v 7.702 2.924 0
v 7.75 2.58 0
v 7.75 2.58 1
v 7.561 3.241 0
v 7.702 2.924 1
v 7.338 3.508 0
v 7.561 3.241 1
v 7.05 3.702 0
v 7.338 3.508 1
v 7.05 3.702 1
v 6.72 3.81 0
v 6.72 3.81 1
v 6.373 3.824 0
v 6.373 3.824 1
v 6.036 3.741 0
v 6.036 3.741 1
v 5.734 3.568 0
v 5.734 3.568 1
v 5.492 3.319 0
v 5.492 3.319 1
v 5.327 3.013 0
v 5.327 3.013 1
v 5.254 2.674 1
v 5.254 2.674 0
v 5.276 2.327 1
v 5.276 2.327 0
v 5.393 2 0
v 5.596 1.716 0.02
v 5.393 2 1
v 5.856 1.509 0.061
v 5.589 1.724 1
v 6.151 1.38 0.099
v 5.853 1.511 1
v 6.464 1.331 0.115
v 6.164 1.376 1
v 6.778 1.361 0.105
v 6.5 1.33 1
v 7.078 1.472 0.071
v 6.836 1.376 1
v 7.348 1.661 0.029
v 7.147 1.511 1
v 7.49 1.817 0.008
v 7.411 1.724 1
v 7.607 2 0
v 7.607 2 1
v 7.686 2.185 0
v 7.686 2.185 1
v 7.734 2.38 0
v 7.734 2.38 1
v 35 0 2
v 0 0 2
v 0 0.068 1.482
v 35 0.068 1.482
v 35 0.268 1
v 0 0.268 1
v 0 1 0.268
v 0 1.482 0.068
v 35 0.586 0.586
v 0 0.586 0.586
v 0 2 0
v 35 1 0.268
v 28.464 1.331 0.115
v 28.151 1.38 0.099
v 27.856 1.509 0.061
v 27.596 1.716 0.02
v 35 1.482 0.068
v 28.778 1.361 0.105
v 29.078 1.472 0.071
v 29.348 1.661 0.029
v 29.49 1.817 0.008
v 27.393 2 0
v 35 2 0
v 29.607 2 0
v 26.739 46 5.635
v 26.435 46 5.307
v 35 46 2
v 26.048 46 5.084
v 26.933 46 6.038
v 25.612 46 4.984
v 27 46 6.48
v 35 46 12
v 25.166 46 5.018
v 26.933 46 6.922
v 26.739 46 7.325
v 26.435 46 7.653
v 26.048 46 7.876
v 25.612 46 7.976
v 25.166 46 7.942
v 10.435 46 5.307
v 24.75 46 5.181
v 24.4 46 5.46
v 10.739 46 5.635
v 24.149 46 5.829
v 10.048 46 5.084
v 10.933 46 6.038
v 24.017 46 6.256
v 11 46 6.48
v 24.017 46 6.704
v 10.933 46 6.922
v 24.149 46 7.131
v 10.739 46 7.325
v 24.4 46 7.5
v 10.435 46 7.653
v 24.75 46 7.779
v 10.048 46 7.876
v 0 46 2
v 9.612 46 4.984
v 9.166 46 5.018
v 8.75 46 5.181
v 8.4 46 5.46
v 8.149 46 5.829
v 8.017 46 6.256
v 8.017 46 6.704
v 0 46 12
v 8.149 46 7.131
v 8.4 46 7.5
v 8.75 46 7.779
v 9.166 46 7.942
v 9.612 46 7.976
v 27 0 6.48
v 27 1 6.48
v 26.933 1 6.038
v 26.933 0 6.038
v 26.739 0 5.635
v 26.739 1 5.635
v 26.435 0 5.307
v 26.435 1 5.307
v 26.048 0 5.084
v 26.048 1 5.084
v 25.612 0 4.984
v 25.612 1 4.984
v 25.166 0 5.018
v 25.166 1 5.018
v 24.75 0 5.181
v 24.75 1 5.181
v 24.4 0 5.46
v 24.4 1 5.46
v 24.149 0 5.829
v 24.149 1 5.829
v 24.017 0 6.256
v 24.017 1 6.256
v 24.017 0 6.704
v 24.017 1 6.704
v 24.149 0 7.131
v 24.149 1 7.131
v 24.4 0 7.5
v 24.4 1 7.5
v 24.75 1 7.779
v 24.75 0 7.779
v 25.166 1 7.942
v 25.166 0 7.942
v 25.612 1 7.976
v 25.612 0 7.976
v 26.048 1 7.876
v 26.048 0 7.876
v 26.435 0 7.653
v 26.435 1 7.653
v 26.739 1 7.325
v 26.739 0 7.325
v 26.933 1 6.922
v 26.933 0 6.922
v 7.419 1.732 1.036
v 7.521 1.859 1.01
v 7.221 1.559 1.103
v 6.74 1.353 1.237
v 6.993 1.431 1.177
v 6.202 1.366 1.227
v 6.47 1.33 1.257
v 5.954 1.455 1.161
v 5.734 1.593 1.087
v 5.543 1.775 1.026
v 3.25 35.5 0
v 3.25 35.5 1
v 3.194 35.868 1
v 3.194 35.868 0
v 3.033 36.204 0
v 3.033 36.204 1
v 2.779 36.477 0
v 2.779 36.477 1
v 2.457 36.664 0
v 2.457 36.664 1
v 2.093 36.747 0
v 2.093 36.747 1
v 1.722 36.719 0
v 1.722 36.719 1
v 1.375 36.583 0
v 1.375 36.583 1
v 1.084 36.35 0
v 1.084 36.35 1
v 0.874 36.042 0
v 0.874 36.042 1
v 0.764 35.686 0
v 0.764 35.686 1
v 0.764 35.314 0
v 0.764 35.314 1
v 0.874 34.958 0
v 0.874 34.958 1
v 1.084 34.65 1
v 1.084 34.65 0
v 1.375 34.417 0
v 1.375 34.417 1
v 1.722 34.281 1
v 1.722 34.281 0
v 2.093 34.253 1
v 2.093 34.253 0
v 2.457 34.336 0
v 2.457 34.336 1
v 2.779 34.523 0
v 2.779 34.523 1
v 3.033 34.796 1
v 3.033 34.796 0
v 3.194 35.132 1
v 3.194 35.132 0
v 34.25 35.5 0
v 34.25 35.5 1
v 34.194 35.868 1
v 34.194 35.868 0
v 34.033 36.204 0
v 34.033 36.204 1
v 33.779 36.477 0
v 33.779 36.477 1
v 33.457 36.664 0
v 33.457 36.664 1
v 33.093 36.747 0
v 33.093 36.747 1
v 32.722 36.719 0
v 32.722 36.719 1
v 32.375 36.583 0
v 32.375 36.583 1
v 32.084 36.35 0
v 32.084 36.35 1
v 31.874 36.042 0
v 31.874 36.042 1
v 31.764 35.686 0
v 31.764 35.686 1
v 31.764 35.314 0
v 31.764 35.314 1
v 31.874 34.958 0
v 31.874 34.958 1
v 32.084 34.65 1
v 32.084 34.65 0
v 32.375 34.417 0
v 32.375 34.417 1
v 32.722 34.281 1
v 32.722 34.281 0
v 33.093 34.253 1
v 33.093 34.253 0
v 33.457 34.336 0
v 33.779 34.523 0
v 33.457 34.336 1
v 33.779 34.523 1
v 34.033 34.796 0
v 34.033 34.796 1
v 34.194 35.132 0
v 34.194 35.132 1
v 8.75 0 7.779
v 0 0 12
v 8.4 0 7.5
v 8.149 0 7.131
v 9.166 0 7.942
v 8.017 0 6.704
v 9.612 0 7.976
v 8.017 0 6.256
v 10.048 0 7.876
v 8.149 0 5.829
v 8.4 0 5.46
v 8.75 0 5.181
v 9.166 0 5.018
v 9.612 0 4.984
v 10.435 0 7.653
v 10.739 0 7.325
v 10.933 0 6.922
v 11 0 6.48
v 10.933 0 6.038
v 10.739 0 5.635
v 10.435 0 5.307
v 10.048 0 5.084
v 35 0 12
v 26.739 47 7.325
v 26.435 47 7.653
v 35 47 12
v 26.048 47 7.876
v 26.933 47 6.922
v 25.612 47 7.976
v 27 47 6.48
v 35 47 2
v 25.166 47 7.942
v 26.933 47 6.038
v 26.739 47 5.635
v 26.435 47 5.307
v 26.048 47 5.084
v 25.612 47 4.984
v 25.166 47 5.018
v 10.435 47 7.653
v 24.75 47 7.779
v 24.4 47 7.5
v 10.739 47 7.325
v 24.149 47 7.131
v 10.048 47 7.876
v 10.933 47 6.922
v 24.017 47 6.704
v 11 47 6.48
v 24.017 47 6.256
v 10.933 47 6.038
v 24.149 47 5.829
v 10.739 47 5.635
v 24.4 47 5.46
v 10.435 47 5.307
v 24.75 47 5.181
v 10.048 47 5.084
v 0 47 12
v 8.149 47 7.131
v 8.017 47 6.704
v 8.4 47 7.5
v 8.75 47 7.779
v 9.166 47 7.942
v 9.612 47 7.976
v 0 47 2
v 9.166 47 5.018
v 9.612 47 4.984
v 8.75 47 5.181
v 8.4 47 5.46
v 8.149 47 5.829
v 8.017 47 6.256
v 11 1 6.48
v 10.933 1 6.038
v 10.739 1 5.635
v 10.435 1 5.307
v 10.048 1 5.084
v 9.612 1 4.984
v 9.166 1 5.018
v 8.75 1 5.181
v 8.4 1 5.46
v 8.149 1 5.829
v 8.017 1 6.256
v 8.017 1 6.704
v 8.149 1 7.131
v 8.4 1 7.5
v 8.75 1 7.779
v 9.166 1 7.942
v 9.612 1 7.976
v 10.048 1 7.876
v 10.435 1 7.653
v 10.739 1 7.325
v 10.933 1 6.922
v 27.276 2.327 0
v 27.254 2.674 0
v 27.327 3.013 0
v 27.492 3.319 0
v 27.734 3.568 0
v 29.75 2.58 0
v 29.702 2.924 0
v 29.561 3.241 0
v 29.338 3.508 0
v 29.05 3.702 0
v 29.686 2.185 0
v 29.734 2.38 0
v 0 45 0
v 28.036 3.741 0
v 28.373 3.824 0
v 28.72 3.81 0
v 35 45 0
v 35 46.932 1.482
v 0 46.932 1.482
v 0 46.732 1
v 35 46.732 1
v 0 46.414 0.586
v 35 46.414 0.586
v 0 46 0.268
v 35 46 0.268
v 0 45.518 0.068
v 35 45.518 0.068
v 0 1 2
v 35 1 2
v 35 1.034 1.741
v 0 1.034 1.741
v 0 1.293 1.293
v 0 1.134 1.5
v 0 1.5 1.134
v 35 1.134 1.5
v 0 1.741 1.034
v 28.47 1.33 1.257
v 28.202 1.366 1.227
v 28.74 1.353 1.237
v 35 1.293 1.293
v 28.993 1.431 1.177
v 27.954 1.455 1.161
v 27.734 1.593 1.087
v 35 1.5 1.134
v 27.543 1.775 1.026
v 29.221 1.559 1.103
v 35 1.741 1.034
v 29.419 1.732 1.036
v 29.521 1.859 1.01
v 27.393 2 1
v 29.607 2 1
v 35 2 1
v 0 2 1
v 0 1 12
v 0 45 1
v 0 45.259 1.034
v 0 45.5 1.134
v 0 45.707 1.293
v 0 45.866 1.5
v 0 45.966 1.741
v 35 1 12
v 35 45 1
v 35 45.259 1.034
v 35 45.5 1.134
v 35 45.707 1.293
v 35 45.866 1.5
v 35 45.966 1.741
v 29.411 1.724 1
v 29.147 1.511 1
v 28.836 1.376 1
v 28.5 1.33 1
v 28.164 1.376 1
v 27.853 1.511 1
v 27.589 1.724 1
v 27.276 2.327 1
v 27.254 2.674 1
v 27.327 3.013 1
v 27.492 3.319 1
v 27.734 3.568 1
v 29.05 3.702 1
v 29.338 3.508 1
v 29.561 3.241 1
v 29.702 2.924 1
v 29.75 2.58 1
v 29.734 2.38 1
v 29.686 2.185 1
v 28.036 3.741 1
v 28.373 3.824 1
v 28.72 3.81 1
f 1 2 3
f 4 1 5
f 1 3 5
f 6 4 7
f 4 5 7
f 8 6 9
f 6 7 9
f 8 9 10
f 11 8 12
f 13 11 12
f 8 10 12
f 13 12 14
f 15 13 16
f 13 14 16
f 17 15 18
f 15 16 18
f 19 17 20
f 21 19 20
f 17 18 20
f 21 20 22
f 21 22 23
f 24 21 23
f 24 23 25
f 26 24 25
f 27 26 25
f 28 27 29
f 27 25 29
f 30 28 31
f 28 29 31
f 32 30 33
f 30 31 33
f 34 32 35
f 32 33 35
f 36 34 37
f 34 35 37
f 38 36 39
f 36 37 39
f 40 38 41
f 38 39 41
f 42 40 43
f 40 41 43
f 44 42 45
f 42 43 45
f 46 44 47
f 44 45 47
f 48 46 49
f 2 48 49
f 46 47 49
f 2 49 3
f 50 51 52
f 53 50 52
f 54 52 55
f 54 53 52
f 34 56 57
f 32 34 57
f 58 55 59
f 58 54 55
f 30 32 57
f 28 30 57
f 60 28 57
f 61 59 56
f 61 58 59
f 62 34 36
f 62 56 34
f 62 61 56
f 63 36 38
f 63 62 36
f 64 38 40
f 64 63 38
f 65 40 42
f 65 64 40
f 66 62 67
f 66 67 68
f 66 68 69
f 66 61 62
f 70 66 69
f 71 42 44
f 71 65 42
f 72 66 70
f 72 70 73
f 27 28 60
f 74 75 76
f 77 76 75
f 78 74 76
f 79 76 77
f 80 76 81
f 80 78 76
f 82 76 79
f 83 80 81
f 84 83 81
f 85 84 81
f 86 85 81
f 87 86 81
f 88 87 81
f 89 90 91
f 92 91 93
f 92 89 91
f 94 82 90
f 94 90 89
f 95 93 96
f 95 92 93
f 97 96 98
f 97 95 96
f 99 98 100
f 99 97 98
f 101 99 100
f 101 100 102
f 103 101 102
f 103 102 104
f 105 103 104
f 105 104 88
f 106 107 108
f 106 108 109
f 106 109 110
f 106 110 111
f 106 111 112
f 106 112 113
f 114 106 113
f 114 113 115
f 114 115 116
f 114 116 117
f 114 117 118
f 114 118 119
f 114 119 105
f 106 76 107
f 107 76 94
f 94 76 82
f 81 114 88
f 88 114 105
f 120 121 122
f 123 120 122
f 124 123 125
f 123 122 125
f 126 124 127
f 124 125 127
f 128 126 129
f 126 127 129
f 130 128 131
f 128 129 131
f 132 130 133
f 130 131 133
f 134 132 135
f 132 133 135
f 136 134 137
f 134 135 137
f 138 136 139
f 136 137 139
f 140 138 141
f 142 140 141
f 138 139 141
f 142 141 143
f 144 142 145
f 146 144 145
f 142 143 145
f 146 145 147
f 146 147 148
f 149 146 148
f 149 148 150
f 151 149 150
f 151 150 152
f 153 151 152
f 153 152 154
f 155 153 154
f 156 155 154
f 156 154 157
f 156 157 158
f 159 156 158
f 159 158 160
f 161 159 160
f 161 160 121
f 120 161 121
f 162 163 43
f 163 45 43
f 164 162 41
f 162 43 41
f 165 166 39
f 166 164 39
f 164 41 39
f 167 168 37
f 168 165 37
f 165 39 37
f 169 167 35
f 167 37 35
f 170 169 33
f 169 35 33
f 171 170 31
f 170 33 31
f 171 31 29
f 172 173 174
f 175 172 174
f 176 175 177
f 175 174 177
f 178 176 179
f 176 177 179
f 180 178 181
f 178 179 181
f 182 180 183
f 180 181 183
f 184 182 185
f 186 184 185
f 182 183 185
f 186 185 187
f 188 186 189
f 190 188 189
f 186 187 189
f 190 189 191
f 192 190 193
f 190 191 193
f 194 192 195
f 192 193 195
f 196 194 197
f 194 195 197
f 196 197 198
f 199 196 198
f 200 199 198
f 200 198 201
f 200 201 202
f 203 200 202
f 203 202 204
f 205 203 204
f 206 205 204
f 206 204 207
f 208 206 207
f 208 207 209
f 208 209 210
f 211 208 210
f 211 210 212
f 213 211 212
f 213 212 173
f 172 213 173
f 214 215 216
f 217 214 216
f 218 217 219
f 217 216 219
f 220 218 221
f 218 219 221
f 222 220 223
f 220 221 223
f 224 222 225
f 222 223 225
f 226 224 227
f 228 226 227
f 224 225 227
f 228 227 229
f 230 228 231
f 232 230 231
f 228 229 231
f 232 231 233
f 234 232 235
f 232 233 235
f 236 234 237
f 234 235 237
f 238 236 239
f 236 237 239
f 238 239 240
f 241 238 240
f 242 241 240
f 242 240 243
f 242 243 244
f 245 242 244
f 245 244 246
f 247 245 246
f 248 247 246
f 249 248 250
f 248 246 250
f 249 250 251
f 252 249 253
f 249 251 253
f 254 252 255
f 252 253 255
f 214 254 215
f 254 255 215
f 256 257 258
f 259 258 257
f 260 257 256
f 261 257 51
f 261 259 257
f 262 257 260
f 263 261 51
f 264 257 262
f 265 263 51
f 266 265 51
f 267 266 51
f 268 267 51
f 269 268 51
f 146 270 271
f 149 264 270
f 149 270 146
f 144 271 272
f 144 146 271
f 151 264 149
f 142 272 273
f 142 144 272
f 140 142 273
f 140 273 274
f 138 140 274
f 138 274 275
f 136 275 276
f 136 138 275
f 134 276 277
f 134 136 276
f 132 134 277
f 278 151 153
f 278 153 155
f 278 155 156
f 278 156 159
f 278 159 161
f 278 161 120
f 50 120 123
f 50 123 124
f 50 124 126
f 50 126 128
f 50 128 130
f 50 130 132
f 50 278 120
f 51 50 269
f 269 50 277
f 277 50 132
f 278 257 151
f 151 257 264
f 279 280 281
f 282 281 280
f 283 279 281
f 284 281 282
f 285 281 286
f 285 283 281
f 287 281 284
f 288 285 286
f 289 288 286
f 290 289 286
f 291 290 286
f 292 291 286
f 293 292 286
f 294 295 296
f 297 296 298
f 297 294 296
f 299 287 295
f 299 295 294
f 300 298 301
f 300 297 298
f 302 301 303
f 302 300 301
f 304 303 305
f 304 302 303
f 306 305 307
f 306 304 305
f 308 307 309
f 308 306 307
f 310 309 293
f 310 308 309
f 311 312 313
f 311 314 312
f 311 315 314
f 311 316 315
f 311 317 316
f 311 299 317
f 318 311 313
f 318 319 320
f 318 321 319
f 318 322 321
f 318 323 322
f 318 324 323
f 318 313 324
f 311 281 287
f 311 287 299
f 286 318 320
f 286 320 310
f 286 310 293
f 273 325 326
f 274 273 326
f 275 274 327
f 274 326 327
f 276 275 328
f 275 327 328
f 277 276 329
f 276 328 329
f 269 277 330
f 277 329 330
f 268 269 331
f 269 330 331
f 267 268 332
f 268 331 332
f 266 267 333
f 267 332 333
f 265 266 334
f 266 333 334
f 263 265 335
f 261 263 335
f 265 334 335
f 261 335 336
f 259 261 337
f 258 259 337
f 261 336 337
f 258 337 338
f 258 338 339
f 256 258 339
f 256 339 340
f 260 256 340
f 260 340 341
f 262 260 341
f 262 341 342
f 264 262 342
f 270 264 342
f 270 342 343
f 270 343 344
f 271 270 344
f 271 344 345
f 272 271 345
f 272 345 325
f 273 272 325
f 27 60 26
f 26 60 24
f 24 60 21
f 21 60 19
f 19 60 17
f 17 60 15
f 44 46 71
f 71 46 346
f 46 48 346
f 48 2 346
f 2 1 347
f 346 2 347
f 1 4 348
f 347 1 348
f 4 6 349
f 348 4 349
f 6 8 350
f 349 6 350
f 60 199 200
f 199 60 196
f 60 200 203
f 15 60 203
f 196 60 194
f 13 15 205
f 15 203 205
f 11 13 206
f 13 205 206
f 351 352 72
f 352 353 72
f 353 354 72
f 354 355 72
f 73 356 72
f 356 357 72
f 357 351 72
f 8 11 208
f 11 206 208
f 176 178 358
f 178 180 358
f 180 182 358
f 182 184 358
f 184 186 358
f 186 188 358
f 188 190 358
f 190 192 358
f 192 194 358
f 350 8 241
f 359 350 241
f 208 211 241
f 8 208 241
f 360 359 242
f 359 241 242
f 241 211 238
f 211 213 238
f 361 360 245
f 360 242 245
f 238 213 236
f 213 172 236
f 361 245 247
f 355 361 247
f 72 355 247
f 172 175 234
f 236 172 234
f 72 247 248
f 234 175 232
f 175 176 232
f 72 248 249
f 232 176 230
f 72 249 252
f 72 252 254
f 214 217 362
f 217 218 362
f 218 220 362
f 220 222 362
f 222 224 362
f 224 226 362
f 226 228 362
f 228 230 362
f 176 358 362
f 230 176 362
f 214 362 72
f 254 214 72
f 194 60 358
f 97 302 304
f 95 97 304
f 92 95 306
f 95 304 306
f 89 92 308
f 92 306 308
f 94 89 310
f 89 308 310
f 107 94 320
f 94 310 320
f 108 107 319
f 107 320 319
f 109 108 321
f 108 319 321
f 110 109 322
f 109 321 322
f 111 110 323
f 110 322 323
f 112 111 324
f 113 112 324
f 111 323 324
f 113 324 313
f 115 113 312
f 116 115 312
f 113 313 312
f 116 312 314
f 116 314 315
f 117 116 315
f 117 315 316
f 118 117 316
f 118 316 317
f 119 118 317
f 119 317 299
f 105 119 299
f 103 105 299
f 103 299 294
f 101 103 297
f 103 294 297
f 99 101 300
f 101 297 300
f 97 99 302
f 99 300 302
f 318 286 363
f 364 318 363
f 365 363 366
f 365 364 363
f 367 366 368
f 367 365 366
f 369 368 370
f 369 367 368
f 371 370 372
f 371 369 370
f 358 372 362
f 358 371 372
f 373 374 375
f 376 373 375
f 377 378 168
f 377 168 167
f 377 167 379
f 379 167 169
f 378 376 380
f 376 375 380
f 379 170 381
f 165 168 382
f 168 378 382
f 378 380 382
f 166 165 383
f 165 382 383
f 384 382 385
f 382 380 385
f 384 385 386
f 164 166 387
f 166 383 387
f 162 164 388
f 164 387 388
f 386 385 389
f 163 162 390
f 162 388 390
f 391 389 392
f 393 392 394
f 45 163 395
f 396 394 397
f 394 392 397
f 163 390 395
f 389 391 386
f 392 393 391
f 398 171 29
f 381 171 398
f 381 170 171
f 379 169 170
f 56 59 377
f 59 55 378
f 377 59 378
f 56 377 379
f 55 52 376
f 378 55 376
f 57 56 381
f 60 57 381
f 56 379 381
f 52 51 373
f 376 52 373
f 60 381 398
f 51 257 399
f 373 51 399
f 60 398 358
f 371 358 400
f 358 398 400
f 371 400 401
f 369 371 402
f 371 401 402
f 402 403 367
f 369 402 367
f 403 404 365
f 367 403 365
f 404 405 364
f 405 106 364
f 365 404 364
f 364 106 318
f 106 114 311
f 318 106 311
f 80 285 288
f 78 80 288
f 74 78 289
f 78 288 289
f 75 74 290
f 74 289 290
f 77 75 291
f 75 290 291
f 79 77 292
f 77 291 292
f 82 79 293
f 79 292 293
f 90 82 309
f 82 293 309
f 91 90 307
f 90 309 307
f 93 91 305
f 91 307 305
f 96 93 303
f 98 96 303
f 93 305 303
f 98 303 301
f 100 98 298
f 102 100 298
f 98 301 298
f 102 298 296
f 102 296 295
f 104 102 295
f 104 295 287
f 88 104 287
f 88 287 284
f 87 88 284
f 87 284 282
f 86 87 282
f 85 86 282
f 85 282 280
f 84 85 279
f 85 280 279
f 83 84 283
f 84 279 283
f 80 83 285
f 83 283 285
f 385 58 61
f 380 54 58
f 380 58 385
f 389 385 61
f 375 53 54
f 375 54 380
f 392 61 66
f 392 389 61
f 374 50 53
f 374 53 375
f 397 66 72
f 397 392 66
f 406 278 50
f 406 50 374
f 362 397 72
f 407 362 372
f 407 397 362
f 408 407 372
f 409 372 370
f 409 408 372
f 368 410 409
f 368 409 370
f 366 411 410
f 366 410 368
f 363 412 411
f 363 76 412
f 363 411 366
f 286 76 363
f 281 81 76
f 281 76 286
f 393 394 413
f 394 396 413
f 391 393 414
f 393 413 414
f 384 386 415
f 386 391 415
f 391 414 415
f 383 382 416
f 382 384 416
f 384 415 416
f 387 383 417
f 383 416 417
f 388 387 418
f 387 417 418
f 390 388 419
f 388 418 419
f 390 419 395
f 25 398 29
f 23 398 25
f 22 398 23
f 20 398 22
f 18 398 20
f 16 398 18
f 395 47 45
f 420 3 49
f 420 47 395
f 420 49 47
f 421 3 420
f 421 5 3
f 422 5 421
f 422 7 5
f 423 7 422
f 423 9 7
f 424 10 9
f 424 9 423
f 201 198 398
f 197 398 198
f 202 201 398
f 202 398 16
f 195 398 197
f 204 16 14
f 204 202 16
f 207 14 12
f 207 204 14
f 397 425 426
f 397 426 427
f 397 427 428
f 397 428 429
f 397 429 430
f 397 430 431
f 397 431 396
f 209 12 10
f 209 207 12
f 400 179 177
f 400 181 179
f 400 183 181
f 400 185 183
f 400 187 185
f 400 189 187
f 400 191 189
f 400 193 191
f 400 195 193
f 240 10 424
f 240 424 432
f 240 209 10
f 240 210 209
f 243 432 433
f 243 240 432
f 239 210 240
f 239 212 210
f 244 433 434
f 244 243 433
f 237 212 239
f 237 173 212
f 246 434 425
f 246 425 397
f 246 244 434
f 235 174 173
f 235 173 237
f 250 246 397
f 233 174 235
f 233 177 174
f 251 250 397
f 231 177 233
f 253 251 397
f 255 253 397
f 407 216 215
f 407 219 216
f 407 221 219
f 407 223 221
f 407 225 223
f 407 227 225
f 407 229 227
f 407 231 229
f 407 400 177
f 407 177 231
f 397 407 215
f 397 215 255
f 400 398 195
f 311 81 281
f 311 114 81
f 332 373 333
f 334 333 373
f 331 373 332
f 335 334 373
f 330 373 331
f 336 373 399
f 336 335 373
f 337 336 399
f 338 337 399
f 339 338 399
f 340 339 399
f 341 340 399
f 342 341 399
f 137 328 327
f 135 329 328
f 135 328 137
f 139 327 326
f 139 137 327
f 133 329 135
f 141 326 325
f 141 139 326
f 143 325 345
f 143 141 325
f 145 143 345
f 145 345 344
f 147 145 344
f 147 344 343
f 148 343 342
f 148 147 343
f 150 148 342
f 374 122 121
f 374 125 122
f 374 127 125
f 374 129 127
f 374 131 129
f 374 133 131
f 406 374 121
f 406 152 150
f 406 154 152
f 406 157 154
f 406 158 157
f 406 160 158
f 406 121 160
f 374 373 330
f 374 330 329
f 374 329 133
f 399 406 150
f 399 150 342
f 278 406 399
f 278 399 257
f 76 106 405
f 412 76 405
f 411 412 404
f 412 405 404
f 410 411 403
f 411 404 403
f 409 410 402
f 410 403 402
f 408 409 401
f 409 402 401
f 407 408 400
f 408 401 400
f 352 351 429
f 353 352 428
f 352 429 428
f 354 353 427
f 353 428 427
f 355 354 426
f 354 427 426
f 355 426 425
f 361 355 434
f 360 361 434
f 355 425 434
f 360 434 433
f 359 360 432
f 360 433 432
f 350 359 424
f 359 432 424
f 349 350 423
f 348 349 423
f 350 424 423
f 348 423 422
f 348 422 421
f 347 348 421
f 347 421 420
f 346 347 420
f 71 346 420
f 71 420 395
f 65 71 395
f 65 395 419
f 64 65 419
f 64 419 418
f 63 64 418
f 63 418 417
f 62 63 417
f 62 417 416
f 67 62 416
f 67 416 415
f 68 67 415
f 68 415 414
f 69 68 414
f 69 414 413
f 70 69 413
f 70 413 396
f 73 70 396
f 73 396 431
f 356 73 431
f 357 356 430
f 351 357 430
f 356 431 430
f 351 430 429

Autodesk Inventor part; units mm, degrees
ref_plane "YZ Plane" through (0, 0, 0) normal (1, 0, 0) x (0, 1, 0)
ref_plane "XZ Plane" through (0, 0, 0) normal (0, 1, 0) x (-1, 0, 0)
ref_plane "XY Plane" through (0, 0, 0) normal (0, 0, 1) x (1, 0, 0)
sketch "Sketch12" plane through (0, 0, 0) normal (0, 0, 1) x (1, 0, 0)
  line L0 (0, 0) -> (35, 0)
  line L1 (35, 0) -> (35, 47)
  line L2 (35, 47) -> (0, 47)
  line L3 (0, 47) -> (0, 0)
  dimension "d49" = 35
  dimension "d50" = 47
extrude "Plate4" add sketch "Sketch12" along normal blind 1
sketch "Sketch13" plane through (0, 0, 0) normal (-1, 0, 0) x (0, 0, 1)
  point P0 (0, 0)
sketch "Sketch14" plane through (0, 46, 0) normal (0, 1, 0) x (-1, 0, 0)
  line L0 (-35, 0) -> (0, 0)
  line L1 (0, 0) -> (0, 12)
  line L2 (0, 12) -> (-35, 12)
  line L3 (-35, 12) -> (-35, 0)
edge flange "Flange3" height 12 angle 90 thickness 1 bend radius 1 thickness toward (0, 1, 0) relief tear relief width 1 relief depth 0.5 edges at (17.5, 47, 1) wall of the first edge with corners at (35, 46, 0) (0, 46, 0) (0, 46, 12) (35, 46, 12)
bend "Bend3"
corner "Corner3"
sketch "Sketch15" plane through (35, 1, 0) normal (0, -1, 0) x (1, 0, 0)
  line L0 (-35, 0) -> (0, 0)
  line L1 (0, 0) -> (0, 12)
  line L2 (0, 12) -> (-35, 12)
  line L3 (-35, 12) -> (-35, 0)
edge flange "Flange4" height 12 angle 90 thickness 1 bend radius 1 thickness toward (0, -1, 0) relief tear relief width 1 relief depth 0.5 edges at (17.5, 0, 1) wall of the first edge with corners at (0, 1, 0) (35, 1, 0) (35, 1, 12) (0, 1, 12)
bend "Bend4"
corner "Corner4"
sketch "Sketch16" plane through (0, 47, 12) normal (0, 1, 0) x (1, 0, 0)
  line L0 (0, 11) -> (0, 10) projected
  line L1 (0, 10) -> (0, 5.52) construction
  line L2 (0, 10) -> (0, 0) projected
  line L3 (0, 5.52) -> (9.5, 5.52) construction
  circle A0 centre (9.5, 5.52) radius 1.5
  line L4 (35, 10) -> (35, 0) projected
  line L5 (35, 10) -> (35, 5.52)
  line L6 (35, 5.52) -> (25.5, 5.52) construction
  circle A1 centre (25.5, 5.52) radius 1.5
  point P0 (0, 12)
  dimension "d72" = 4.48
  dimension "d73" = 9.5
  dimension "d74" = 3
  dimension "d75" = 4.48
  dimension "d76" = 9.5
  dimension "d77" = 3
extrude "Extrusion4" cut sketch "Sketch16" against normal through all
sketch "Sketch17" plane through (0, 0, 1) normal (0, 0, 1) x (1, 0, 0)
  line L0 (35, 45) -> (0, 45) construction
  line L1 (0, 45) -> (2, 45) construction
  line L2 (2, 45) -> (2, 35.5) construction
  line L3 (35, 45) -> (33, 45) construction
  line L4 (33, 45) -> (33, 35.5) construction
  circle A0 centre (2, 35.5) radius 1.25
  circle A1 centre (33, 35.5) radius 1.25
  point P0 (0, 0)
  dimension "d80" = 2
  dimension "d81" = 9.5
  dimension "d82" = 2
  dimension "d83" = 2.5
  dimension "d84" = 9.5
extrude "Extrusion5" cut sketch "Sketch17" against normal blind 10
sketch "Sketch18" plane through (0, 0, 1) normal (0, 0, 1) x (1, 0, 0)
  line L0 (0, 2) -> (0, 45) projected
  line L1 (0, 2) -> (6.5, 2) construction
  line L2 (6.5, 2) -> (6.5, 2.58) construction
  circle A0 centre (6.5, 2.58) radius 1.25
  line L3 (35, 45) -> (35, 2) projected
  line L4 (35, 2) -> (28.5, 2) construction
  line L5 (35, 2) -> (0, 2) projected
  line L6 (28.5, 2) -> (28.5, 2.58) construction
  circle A1 centre (28.5, 2.58) radius 1.25
  point P0 (0, 0)
  dimension "d87" = 6.5
  dimension "d88" = 0.58
  dimension "d89" = 2.5
  dimension "d90" = 6.5
  dimension "d91" = 0.58
  dimension "d92" = 2.5
extrude "Extrusion6" cut sketch "Sketch18" against normal blind 10
sketch "Sketch20" plane through (0, 0, 1) normal (0, 0, 1) x (1, 0, 0)
  arc A0 (7.6073, 2) -> (5.3927, 2) centre (6.5, 2.58) ccw projected
  arc A1 (5.3927, 2) -> (7.6073, 2) centre (6.5, 2.58) ccw projected
  circle A2 centre (6.5, 2.58) radius 1.25
  arc A3 (29.6073, 2) -> (27.3927, 2) centre (28.5, 2.58) ccw projected
  arc A4 (27.3927, 2) -> (29.6073, 2) centre (28.5, 2.58) ccw projected
  circle A5 centre (28.5, 2.58) radius 1.25
  point P0 (0, 0)
extrude "Extrusion7" cut sketch "Sketch20" along normal through all
equation "\"d51\" = Thickness"
equation "\"d52\" = BendReliefWidth"
equation "\"d53\" = BendReliefDepth"
equation "\"d54\" = MinimumRemnant"
equation "\"d55\" = TransitionRadius"
equation "\"d58\" = BendRadius"
equation "\"d59\" = CornerReliefSize"
equation "\"d60\" = GapSize"
equation "\"d61\" = JacobiRadiusSize"
equation "\"d62\" = BendReliefWidth"
equation "\"d63\" = BendReliefDepth"
equation "\"d64\" = MinimumRemnant"
equation "\"d65\" = TransitionRadius"
equation "\"d68\" = BendRadius"
equation "\"d69\" = CornerReliefSize"
equation "\"d70\" = GapSize"
equation "\"d71\" = JacobiRadiusSize"
equation "\"BendRadius\" = Thickness"
equation "\"BendReliefWidth\" = Thickness"
equation "\"BendReliefDepth\" = 0.5 * Thickness"
equation "\"CornerReliefSize\" = 4 * Thickness"
equation "\"MinimumRemnant\" = 2 * Thickness"
equation "\"TransitionRadius\" = BendRadius"
equation "\"JacobiRadiusSize\" = BendRadius"
equation "\"GapSize\" = Thickness"
equation "\"Thickness\" = 1"
properties part number "Suportmotor"
